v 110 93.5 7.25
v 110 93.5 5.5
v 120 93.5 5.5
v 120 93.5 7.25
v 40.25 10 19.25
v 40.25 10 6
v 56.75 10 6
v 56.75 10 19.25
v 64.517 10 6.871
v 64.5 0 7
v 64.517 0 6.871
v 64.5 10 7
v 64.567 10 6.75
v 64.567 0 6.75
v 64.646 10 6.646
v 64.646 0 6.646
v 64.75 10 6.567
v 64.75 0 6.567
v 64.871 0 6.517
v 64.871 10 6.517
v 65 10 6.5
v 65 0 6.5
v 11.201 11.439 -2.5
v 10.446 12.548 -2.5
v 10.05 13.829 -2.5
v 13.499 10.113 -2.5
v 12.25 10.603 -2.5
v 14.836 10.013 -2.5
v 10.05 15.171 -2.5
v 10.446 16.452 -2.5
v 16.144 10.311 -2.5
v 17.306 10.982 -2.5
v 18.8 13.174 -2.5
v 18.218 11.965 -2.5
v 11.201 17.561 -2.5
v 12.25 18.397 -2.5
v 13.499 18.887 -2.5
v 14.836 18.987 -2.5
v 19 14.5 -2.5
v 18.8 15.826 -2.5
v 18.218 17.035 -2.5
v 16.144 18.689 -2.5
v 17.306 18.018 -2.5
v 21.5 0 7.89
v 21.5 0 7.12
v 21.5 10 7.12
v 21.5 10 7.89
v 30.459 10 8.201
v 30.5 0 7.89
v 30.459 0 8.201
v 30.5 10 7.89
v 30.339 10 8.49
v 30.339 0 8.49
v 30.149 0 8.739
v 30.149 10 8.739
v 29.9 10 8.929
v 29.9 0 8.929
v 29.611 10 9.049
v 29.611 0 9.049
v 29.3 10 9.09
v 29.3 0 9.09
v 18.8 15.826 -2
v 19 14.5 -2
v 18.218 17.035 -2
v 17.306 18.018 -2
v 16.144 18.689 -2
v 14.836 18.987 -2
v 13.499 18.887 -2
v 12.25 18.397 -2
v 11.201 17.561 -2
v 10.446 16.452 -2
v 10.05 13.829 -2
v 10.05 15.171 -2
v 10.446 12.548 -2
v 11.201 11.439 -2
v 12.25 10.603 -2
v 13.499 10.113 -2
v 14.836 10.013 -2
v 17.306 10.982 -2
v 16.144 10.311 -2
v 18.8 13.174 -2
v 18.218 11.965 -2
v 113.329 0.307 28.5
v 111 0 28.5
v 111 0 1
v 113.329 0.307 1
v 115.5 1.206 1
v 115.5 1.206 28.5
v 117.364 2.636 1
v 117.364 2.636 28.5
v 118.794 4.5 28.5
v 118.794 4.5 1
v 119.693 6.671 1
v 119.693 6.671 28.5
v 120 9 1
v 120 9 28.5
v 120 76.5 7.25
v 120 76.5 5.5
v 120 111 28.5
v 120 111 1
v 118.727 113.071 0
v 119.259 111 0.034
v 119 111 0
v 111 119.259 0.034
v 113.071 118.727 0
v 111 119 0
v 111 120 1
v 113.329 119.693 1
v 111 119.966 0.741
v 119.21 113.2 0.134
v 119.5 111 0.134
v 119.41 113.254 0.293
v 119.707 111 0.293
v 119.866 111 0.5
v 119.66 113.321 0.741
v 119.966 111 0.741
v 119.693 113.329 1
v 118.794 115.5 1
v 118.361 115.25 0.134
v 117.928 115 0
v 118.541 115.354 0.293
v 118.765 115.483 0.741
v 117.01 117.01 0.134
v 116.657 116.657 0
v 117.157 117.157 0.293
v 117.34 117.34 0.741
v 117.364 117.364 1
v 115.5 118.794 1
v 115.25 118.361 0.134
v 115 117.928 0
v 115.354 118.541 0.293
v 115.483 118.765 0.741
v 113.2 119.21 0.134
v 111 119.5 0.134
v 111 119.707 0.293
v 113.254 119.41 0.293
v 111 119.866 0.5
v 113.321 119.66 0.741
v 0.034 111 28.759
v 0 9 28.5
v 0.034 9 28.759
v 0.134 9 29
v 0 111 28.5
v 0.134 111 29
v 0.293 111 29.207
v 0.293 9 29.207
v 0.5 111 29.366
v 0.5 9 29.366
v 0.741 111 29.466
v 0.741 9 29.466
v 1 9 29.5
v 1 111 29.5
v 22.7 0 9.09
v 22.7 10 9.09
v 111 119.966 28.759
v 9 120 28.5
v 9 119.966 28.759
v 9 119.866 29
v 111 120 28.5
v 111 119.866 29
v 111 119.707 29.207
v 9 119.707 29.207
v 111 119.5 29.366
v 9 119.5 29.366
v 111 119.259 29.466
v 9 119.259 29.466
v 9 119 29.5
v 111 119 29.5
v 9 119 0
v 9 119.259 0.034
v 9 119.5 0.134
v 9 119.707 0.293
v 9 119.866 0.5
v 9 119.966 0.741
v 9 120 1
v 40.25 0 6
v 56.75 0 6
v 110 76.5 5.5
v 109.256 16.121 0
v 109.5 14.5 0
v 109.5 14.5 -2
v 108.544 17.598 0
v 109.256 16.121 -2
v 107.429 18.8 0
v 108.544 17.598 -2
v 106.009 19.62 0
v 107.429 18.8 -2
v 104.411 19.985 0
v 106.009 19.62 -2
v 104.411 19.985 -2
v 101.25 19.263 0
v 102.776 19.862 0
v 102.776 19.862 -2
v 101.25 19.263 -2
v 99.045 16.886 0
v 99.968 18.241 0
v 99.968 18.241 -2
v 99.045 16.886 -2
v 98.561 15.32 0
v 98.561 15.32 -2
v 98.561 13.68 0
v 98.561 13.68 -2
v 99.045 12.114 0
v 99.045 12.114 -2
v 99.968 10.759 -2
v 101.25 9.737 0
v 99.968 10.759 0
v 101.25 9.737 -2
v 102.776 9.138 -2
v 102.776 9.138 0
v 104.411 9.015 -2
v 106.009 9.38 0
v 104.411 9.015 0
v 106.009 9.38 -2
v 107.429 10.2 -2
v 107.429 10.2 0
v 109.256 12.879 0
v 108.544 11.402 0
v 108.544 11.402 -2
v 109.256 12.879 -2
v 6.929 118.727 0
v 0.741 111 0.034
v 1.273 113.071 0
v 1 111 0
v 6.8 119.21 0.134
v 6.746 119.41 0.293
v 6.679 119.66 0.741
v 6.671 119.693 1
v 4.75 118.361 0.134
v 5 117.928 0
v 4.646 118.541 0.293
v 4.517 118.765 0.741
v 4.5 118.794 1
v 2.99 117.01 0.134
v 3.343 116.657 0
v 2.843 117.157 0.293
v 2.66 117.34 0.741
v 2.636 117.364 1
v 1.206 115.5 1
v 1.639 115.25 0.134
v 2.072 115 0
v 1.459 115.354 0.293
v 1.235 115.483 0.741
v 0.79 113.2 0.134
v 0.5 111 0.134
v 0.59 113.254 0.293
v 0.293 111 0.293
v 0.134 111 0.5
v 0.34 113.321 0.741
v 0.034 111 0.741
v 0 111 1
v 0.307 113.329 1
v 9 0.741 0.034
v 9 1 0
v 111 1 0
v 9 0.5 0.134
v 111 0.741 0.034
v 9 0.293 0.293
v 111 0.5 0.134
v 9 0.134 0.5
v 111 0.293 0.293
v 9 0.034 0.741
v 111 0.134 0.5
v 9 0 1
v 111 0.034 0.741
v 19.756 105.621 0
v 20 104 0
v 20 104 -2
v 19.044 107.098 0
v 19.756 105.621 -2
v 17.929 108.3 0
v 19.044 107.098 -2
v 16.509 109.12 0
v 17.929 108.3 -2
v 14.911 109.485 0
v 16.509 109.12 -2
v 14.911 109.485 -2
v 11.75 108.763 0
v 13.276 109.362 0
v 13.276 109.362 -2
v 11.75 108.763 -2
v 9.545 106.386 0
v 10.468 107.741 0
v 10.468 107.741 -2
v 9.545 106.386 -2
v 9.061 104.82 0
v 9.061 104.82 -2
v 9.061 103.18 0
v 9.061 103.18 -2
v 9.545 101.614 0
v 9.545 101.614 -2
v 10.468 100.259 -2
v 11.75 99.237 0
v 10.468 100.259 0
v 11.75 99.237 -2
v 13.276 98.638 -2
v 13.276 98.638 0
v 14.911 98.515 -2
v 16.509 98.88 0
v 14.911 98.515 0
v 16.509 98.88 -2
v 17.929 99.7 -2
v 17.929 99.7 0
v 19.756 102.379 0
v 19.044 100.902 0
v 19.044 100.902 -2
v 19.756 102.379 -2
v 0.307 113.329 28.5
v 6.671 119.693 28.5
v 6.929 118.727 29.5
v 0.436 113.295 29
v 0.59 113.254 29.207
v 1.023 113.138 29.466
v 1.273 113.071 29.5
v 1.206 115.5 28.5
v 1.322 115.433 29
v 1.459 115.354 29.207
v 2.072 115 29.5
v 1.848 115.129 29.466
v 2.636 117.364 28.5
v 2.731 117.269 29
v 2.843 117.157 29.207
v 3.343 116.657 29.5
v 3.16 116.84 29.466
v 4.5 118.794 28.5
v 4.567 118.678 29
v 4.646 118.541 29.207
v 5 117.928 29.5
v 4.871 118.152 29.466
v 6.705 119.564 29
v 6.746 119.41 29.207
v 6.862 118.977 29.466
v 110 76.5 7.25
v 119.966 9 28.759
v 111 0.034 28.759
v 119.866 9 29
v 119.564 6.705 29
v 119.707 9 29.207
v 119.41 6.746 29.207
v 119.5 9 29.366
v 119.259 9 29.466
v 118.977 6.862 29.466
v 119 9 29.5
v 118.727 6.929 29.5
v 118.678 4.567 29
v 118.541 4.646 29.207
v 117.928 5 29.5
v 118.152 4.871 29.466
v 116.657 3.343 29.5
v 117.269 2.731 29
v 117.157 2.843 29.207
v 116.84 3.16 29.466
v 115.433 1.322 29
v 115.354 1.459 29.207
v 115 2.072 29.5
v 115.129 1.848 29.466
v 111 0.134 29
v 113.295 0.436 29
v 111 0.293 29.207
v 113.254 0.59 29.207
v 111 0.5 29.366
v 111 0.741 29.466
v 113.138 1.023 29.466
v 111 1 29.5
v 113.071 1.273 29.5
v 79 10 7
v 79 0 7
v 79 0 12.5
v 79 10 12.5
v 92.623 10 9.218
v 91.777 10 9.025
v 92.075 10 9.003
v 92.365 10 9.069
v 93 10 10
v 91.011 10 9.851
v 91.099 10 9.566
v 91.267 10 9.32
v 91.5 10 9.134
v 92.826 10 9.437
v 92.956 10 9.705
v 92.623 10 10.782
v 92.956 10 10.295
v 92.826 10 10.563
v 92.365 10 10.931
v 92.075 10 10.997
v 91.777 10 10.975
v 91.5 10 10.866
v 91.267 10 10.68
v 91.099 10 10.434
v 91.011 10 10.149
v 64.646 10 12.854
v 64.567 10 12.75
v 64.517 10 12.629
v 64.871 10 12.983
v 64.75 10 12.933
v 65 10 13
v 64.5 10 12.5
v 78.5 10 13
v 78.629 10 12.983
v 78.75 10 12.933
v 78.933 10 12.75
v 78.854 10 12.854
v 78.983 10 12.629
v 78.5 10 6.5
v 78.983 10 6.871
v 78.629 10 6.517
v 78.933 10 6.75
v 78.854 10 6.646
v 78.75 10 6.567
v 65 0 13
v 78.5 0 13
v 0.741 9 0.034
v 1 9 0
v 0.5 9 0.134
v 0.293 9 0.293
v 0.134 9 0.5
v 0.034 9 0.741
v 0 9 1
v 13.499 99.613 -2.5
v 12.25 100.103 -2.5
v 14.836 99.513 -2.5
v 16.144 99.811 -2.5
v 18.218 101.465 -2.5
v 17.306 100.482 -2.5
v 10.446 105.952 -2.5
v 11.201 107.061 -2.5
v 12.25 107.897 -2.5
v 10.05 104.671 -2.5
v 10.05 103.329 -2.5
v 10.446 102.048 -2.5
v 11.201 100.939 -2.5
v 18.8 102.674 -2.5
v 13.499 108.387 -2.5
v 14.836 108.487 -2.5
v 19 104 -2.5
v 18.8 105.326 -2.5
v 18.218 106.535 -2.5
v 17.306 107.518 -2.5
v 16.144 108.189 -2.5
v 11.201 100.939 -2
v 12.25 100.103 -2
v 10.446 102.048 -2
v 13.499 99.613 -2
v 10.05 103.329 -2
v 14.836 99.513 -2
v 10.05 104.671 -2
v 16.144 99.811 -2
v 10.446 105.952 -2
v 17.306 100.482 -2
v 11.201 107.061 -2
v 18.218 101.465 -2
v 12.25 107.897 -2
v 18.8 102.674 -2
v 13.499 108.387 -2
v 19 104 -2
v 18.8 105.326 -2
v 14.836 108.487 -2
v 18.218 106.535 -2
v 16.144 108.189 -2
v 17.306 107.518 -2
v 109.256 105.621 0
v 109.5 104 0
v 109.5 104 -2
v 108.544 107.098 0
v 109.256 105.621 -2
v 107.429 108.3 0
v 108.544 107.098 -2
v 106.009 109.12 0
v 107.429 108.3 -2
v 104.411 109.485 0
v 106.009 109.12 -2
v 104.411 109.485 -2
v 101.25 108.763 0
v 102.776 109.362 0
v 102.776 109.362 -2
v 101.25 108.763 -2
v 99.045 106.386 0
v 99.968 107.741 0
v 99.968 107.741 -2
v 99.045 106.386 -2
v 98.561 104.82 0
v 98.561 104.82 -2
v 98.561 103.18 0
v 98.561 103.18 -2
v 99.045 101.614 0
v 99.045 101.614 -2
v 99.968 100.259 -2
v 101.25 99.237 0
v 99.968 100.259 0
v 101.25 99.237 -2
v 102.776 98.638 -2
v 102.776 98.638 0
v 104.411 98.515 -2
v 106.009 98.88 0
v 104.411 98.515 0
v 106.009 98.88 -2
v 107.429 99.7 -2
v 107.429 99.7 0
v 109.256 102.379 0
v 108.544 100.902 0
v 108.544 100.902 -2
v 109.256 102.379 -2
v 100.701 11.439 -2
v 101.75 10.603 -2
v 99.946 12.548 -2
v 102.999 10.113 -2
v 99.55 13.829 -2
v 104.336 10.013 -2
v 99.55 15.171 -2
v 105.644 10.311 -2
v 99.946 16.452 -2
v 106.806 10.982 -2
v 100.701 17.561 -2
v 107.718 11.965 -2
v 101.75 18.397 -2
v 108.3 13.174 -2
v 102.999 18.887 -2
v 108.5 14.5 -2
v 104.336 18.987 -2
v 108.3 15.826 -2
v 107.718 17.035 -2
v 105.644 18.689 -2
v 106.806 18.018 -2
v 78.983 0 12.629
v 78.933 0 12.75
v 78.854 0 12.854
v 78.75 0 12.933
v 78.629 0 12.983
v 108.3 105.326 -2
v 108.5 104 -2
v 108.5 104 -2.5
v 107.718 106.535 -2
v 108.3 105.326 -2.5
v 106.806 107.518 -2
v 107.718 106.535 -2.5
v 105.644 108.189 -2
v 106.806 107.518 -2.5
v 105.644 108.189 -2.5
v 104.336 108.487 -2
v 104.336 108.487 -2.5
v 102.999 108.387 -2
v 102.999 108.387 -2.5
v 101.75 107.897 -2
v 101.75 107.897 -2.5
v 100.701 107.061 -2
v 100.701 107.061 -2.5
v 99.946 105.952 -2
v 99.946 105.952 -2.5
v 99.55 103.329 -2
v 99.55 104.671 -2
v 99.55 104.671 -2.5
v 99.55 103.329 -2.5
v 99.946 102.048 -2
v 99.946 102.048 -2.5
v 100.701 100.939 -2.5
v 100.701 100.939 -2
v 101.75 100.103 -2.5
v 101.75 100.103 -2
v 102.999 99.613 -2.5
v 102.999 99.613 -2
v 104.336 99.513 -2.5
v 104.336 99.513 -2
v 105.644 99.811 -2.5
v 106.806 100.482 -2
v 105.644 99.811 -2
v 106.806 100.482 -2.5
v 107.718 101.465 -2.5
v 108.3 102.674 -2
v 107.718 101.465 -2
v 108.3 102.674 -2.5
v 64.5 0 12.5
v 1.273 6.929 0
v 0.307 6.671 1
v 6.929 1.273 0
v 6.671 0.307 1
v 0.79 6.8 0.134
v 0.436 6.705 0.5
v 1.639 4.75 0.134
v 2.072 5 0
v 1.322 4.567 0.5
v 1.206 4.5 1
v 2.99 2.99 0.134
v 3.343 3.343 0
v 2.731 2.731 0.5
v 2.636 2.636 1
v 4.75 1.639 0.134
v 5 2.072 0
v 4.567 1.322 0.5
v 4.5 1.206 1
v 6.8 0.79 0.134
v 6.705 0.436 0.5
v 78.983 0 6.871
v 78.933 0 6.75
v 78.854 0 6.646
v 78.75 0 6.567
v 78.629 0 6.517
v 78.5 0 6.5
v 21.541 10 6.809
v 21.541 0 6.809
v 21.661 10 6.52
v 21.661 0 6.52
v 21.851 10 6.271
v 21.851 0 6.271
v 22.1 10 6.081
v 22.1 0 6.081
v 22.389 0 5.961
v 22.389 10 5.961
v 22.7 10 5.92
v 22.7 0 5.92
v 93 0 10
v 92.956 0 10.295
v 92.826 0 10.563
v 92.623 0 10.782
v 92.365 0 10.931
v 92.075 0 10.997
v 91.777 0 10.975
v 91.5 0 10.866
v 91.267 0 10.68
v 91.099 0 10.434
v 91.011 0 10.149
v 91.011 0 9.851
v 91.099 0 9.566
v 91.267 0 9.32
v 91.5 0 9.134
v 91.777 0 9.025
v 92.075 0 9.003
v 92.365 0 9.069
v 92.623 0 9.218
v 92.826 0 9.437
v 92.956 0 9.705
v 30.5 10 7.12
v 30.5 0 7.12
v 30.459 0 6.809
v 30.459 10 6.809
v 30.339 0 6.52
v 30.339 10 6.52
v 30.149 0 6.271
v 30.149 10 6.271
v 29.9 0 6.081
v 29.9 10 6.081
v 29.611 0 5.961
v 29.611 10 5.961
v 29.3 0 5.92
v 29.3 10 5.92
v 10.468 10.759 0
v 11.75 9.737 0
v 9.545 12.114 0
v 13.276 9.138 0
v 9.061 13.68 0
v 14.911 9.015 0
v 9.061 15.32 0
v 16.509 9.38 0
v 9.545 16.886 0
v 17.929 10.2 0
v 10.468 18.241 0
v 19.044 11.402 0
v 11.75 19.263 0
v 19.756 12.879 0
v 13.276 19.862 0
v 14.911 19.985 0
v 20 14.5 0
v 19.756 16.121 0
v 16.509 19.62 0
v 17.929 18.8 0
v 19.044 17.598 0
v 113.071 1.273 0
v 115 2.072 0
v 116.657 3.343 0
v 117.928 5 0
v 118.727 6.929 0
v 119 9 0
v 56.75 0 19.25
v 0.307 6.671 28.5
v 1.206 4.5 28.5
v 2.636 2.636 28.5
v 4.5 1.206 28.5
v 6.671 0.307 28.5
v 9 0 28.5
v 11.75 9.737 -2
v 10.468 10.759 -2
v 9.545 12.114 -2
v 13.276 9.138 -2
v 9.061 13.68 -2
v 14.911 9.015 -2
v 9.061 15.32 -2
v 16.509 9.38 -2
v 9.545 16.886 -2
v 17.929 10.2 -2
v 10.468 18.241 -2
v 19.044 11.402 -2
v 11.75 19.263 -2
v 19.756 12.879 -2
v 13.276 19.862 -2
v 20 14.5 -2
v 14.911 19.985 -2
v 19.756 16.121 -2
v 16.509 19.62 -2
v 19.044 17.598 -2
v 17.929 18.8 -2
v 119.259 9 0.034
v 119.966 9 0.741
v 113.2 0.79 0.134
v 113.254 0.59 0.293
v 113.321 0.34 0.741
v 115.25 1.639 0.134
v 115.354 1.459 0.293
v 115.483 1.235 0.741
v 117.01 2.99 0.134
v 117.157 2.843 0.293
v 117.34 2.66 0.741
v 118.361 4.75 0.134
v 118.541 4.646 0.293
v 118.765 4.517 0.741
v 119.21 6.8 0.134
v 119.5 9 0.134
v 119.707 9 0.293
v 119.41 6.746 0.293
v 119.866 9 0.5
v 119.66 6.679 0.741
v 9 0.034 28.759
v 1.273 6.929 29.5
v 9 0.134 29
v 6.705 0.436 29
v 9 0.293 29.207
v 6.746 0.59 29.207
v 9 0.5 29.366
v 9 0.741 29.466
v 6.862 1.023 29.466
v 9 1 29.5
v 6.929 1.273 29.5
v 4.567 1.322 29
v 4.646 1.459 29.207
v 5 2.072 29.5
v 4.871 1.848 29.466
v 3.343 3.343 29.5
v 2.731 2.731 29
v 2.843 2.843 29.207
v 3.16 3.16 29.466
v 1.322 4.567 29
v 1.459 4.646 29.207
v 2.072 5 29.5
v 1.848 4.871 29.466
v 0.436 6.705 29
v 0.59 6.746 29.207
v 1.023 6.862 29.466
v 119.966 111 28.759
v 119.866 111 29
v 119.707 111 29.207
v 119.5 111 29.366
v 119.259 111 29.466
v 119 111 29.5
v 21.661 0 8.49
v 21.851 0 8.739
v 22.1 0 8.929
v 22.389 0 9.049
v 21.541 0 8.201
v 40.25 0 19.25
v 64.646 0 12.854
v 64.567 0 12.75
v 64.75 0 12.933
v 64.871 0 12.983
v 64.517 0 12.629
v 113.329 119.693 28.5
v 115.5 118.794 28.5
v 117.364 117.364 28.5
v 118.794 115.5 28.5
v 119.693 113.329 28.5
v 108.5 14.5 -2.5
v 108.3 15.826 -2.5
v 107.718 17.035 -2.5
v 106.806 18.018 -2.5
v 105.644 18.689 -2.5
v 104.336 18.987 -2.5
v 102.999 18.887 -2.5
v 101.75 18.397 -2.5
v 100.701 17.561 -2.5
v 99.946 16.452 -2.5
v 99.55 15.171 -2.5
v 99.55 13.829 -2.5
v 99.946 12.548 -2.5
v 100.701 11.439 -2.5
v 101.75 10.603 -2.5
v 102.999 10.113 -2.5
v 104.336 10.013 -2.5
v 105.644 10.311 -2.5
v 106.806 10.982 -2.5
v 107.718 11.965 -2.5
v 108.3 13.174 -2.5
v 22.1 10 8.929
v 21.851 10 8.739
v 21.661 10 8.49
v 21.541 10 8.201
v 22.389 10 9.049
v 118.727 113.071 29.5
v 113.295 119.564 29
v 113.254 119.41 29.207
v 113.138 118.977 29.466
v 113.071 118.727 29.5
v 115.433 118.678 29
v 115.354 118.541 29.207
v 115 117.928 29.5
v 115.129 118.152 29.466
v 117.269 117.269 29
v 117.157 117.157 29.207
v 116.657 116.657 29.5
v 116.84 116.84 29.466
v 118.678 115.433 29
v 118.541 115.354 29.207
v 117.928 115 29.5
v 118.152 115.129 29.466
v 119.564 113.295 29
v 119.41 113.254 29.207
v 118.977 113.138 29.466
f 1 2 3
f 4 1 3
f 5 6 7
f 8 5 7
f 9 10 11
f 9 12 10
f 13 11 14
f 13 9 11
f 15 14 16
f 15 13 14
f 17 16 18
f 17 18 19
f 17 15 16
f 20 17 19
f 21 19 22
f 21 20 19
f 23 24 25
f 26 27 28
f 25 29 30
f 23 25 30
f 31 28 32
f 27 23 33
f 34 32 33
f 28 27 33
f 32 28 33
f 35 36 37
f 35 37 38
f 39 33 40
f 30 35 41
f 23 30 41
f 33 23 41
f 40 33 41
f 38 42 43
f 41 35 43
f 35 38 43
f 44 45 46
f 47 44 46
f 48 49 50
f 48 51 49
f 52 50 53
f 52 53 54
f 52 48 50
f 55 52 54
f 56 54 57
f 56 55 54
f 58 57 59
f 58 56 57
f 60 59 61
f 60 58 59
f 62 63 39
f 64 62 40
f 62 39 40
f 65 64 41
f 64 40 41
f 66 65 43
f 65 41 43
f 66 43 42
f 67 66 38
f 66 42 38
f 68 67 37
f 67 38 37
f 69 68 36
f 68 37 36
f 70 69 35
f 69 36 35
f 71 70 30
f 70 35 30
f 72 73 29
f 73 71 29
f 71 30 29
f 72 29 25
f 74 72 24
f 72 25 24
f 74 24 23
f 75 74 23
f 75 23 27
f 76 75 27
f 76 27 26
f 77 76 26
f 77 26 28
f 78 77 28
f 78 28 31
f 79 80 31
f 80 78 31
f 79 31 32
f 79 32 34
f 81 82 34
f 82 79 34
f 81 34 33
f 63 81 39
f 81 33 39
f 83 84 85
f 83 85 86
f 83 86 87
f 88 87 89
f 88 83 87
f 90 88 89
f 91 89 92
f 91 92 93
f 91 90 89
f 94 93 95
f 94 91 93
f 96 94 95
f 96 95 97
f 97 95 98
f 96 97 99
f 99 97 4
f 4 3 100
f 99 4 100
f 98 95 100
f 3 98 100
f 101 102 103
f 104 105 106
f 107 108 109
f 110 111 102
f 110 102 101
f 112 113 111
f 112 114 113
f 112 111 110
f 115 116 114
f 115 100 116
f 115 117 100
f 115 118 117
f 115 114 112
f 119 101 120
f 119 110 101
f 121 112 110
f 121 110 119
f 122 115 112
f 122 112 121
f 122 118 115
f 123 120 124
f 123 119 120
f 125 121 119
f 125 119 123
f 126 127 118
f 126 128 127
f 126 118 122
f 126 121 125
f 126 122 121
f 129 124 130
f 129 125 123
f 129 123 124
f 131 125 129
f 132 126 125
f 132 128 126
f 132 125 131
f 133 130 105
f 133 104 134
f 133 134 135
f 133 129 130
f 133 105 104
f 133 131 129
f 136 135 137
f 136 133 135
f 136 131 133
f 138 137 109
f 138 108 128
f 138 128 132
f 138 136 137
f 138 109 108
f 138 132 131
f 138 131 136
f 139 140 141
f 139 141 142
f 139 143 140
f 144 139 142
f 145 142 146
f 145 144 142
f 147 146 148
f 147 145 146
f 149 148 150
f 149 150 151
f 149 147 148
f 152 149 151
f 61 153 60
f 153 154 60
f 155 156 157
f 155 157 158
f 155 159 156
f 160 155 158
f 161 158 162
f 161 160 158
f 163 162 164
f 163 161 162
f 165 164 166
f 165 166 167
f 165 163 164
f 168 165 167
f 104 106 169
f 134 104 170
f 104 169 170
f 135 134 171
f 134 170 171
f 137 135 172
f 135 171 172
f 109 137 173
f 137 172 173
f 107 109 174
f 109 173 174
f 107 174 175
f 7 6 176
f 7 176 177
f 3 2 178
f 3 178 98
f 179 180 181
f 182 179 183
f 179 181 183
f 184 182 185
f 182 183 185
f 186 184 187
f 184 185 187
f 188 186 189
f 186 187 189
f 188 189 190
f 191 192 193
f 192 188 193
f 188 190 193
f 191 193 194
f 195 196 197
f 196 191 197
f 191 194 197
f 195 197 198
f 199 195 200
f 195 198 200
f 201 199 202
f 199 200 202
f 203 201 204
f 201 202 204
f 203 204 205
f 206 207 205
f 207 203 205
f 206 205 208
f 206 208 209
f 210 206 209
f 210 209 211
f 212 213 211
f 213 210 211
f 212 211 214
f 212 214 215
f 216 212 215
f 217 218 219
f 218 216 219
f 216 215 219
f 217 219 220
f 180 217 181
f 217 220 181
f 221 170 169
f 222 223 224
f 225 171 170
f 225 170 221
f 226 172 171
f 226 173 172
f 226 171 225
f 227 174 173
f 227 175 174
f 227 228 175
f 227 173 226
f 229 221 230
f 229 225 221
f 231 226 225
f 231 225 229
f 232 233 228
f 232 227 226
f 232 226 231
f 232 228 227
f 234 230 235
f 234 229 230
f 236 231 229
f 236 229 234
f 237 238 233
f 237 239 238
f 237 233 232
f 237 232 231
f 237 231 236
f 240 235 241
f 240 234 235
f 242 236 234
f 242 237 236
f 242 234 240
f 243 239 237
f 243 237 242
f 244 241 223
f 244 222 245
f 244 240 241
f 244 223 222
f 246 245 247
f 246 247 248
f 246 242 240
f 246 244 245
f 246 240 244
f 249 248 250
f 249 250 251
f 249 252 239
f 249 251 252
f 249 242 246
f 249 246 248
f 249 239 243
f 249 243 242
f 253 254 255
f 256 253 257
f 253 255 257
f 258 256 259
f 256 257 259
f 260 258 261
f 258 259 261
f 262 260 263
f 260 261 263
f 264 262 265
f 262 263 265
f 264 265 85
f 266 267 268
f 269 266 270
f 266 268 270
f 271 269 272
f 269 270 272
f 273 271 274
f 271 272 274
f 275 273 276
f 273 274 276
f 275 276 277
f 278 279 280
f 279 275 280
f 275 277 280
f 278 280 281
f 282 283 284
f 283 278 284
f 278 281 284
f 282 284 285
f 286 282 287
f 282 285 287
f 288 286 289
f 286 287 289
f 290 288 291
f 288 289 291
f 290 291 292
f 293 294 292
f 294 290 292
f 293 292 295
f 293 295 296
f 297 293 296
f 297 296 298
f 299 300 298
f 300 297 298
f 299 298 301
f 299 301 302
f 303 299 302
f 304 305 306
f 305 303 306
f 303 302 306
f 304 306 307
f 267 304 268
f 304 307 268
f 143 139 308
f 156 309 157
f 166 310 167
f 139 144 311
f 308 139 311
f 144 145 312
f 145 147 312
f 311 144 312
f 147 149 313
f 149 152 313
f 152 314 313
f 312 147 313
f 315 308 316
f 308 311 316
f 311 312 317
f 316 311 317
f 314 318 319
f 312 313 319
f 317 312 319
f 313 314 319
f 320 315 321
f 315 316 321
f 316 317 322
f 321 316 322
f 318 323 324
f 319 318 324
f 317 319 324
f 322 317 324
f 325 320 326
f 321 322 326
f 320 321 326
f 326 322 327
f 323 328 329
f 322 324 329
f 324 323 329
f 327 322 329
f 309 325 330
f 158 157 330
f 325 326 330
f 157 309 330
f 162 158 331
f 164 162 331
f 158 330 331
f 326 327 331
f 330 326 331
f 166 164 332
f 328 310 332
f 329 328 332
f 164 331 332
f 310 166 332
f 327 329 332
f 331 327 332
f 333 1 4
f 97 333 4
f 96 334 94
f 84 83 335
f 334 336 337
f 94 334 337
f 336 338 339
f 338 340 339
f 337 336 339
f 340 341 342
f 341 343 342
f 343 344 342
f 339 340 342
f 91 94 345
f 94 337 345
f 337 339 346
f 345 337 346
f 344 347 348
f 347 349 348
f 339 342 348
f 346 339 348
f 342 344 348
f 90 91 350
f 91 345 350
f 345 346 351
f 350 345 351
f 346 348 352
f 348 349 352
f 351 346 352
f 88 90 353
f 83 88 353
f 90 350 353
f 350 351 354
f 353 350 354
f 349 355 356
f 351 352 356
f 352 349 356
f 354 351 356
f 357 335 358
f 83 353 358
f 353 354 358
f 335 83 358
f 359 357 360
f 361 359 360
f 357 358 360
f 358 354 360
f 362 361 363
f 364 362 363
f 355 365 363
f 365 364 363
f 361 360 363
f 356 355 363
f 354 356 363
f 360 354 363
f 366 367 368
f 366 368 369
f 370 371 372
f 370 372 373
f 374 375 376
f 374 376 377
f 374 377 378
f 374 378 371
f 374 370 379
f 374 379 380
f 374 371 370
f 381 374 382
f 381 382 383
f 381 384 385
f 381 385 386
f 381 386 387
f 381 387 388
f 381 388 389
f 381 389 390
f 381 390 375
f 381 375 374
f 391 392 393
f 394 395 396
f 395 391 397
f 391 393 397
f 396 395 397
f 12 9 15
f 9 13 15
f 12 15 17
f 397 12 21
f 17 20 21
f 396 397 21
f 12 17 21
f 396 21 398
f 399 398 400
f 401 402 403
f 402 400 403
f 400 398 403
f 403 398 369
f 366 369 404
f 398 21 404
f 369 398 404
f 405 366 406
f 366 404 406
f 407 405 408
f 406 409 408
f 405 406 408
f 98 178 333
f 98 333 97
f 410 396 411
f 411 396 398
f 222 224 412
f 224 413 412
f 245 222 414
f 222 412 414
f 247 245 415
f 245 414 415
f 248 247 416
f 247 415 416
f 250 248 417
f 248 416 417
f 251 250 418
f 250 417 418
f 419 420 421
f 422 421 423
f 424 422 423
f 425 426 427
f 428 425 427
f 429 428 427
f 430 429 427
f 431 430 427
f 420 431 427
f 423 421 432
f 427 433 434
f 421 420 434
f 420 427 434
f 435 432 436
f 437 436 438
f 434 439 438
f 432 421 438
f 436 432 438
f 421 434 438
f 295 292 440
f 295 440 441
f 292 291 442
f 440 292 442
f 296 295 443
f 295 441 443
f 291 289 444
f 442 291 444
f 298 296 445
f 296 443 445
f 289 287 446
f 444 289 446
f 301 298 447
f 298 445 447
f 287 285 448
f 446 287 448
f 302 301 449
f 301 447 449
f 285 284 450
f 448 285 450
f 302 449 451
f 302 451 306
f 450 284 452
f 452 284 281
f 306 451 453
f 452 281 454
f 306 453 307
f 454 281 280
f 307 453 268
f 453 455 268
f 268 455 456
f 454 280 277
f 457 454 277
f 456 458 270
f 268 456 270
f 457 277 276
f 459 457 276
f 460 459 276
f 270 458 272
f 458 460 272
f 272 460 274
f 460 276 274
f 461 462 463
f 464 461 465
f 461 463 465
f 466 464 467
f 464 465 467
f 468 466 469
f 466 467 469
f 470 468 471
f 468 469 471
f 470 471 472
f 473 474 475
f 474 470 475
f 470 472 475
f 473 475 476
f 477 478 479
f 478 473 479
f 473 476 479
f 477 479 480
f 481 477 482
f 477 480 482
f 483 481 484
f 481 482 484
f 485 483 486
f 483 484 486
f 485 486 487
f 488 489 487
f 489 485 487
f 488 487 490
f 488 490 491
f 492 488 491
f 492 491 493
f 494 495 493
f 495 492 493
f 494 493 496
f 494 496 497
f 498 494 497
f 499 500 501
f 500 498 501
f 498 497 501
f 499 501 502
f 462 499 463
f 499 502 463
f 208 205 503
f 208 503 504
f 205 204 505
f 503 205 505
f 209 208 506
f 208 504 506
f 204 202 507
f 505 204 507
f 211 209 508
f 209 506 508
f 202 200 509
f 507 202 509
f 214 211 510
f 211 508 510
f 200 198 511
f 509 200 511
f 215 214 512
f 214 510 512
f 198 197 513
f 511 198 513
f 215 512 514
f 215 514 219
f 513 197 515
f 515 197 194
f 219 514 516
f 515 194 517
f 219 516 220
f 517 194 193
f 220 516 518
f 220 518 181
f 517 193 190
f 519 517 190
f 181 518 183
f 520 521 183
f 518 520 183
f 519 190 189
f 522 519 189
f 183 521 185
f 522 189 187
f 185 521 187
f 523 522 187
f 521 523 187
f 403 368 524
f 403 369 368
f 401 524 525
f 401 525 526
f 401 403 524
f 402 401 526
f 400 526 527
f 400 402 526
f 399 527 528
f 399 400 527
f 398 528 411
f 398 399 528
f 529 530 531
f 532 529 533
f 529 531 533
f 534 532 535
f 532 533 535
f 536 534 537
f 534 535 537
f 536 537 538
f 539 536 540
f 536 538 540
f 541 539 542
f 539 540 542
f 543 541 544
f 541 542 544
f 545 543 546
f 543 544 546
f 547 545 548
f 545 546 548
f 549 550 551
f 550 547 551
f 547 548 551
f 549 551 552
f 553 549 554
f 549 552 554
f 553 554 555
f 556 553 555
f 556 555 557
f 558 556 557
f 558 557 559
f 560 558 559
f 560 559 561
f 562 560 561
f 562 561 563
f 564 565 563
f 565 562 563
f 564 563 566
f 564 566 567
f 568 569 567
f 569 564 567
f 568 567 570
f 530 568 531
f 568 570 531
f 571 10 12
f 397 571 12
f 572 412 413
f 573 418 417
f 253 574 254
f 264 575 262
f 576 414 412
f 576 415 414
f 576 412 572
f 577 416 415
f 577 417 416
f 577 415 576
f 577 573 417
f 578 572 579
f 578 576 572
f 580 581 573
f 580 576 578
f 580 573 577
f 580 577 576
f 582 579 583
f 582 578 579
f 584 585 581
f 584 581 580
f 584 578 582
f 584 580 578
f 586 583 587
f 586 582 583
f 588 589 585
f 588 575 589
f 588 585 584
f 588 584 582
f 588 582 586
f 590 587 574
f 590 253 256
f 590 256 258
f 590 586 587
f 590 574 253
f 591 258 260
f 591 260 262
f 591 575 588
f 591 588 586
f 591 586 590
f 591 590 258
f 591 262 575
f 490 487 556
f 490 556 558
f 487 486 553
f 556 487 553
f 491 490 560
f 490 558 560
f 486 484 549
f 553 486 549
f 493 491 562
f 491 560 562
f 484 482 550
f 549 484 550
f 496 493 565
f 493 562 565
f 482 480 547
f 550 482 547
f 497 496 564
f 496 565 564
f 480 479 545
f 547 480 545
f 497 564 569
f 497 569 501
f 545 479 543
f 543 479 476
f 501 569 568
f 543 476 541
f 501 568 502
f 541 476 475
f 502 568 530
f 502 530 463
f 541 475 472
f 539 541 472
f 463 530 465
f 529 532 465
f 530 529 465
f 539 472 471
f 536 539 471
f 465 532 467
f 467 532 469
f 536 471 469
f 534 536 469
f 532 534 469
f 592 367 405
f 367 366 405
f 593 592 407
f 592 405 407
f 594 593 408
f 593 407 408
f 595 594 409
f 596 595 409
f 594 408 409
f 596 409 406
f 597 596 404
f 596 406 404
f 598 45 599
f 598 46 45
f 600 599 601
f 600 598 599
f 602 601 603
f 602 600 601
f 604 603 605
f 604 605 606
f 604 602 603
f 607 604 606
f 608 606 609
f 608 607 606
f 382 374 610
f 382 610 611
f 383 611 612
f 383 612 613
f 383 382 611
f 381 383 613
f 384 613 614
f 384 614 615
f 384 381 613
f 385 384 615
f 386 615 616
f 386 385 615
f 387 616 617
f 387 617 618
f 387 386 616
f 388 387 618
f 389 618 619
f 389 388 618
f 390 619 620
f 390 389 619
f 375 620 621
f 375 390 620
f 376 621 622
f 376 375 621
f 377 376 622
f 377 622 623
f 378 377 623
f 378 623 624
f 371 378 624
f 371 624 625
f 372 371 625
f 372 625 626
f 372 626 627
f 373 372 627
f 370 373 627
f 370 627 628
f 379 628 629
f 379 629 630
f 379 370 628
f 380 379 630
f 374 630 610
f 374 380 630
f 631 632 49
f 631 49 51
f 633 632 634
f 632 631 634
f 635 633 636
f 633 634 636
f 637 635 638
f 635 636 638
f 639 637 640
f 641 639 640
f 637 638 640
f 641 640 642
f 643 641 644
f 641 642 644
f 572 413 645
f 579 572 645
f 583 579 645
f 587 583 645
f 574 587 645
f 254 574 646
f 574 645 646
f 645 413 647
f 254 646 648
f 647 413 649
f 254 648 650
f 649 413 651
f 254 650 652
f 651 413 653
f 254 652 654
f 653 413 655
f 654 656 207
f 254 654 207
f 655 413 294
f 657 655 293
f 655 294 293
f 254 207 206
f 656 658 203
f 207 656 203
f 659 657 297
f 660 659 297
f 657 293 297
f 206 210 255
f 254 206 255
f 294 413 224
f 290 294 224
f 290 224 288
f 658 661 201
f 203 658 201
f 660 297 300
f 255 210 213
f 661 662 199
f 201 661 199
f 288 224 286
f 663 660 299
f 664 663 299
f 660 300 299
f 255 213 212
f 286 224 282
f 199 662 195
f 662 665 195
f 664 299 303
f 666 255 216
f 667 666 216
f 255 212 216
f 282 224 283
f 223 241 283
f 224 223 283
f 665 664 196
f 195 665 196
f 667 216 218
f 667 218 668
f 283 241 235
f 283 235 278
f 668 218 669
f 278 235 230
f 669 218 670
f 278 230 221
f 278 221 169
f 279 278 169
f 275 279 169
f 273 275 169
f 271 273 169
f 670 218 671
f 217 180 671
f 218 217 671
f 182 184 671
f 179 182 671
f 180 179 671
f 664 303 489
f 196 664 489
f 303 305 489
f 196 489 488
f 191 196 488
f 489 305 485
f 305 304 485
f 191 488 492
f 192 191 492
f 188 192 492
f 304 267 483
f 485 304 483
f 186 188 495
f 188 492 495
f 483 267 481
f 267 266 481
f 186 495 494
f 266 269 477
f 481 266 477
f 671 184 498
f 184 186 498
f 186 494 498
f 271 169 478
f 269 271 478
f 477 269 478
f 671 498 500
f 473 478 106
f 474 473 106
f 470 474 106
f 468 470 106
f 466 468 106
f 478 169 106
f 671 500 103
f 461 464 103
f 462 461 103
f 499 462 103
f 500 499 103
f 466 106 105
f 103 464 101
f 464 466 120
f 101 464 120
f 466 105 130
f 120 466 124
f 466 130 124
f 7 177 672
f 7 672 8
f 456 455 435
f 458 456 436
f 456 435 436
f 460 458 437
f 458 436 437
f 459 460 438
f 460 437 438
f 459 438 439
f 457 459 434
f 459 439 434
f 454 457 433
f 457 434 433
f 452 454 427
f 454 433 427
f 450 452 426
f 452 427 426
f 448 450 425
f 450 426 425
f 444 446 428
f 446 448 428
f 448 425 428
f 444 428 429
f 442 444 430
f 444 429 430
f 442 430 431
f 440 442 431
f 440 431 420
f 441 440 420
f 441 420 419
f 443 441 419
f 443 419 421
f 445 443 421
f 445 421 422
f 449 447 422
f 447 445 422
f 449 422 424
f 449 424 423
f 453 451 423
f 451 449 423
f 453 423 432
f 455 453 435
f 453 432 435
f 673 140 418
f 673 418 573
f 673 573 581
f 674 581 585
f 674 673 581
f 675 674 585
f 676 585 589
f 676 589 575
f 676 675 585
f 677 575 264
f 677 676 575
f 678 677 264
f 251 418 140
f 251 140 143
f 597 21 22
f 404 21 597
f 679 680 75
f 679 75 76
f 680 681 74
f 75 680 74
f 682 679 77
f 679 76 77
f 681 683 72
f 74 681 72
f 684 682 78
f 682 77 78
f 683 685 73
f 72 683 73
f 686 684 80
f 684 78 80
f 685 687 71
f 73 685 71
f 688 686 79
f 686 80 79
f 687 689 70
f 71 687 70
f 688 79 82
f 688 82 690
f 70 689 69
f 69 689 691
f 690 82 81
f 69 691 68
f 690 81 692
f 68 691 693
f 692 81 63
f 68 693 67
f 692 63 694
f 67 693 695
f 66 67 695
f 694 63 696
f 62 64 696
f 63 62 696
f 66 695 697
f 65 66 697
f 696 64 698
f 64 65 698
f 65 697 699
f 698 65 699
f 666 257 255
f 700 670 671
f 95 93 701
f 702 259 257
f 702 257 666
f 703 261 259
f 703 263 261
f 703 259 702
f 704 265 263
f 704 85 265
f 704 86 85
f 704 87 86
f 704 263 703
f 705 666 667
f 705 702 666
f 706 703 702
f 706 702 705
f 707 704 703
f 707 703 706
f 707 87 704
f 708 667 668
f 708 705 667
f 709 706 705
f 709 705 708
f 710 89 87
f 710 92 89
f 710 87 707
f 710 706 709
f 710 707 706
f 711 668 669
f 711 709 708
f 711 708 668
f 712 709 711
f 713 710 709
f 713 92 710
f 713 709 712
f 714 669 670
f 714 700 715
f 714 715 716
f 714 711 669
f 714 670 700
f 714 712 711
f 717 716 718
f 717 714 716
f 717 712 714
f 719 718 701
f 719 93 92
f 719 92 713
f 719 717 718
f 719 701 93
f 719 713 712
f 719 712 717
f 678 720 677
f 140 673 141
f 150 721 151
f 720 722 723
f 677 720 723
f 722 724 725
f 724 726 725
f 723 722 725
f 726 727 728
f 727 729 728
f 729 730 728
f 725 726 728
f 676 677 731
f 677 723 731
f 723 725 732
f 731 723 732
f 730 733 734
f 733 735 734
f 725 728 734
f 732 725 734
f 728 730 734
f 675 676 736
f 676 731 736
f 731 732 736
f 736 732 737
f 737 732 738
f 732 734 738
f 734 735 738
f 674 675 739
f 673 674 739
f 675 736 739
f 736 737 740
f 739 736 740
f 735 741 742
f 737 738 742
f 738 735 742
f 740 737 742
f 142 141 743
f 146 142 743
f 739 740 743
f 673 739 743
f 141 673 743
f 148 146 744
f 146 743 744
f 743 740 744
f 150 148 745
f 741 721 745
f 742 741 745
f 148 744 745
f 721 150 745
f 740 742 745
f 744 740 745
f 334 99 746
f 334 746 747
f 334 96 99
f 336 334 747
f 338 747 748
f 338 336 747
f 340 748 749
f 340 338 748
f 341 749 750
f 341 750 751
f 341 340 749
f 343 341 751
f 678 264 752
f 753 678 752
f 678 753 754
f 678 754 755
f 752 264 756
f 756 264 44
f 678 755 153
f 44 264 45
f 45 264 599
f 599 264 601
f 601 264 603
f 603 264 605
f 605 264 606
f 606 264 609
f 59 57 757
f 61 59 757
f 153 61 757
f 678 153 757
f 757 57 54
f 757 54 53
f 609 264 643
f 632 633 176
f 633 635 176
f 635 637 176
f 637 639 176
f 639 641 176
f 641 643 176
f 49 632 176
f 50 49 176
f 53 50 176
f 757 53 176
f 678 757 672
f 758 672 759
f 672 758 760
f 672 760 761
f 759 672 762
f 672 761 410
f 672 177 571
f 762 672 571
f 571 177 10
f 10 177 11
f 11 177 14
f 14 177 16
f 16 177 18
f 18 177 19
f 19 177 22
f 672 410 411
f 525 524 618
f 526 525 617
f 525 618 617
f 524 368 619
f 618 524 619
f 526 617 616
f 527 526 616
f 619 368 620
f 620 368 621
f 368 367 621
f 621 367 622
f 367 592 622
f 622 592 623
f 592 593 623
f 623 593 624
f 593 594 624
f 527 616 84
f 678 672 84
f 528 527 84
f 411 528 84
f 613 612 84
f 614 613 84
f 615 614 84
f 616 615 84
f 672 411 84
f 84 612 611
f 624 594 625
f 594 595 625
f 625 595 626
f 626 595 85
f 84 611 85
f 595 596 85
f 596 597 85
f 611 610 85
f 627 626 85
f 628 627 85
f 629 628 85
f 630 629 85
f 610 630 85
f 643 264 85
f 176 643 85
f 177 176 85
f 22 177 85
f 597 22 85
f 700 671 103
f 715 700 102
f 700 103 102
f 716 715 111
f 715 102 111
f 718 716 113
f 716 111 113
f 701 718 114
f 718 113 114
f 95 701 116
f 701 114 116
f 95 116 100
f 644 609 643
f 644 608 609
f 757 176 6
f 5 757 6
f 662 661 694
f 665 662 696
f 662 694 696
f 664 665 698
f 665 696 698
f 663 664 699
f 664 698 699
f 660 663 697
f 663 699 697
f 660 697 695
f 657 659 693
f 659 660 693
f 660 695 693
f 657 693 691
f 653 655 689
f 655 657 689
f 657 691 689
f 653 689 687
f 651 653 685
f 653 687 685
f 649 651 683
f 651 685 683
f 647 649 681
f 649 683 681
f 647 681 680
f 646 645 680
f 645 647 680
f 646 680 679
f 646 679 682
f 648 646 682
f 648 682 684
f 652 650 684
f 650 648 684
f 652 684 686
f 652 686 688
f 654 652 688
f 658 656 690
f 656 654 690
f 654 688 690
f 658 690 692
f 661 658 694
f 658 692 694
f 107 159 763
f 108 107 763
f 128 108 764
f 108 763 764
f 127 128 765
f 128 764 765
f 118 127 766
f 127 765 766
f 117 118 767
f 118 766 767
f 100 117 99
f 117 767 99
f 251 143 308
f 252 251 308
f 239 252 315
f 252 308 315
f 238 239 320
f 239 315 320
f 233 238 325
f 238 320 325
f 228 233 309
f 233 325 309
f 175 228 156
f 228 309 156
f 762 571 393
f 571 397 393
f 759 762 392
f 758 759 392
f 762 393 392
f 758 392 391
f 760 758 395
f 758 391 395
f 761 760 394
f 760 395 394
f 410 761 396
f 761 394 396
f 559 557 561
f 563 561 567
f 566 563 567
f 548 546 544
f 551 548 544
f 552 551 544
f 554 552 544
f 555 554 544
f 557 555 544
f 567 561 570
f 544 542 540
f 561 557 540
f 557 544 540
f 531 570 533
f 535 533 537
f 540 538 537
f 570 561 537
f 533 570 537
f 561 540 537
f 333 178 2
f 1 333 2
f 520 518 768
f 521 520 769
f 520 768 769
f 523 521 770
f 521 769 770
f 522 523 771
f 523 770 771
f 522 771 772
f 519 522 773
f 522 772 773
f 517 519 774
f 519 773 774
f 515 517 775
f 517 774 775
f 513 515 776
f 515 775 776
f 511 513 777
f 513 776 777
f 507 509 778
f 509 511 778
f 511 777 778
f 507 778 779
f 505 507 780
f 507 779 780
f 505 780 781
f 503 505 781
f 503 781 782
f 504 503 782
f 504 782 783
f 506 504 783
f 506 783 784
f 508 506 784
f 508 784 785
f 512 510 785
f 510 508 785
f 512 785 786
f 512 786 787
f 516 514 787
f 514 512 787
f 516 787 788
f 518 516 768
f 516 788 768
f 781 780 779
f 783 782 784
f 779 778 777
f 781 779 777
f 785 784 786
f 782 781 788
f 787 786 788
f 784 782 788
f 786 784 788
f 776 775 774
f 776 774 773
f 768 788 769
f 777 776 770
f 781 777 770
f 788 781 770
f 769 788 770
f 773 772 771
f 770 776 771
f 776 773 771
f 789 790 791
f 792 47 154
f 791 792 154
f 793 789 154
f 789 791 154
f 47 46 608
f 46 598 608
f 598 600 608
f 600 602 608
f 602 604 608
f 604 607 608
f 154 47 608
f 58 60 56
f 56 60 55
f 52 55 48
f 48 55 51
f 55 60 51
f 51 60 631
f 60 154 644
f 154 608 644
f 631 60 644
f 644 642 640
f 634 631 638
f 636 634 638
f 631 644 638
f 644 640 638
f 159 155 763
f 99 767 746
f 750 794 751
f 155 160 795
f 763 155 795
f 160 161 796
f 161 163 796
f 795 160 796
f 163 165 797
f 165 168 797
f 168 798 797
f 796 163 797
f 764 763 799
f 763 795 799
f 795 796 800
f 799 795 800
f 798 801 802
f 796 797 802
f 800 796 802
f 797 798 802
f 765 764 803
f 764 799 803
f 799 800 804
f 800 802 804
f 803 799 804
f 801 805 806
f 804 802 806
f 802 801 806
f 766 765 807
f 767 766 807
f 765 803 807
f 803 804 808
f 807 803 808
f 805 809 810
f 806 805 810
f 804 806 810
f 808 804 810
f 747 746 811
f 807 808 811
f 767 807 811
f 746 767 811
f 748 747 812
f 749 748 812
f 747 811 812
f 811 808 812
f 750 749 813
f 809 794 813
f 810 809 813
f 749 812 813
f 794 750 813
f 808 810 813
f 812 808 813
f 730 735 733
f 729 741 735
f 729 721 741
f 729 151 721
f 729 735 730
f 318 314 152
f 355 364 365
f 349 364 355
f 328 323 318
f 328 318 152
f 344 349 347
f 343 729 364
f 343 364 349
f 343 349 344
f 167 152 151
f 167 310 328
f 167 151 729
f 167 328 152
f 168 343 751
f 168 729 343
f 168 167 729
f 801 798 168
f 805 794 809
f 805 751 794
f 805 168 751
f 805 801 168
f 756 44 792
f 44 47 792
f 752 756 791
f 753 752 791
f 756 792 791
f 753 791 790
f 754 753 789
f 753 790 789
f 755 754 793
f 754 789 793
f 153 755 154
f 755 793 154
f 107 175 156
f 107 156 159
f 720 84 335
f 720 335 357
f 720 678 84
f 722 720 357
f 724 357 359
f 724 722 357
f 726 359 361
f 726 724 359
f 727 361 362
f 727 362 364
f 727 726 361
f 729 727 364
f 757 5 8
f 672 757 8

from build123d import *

# Parameters (mm, degrees)
CYLINDER012_R     = 4.5
CYLINDER012_DEPTH = 10
CYLINDER011_R     = 5.5
CYLINDER011_DEPTH = 10
CYLINDER014_R     = 4.5
CYLINDER014_DEPTH = 10
CYLINDER013_R     = 5.5
CYLINDER013_DEPTH = 10
CYLINDER016_R     = 4.5
CYLINDER016_DEPTH = 10
CYLINDER015_R     = 5.5
CYLINDER015_DEPTH = 10
CYLINDER018_R     = 4.5
CYLINDER018_DEPTH = 10
CYLINDER017_R     = 5.5
CYLINDER017_DEPTH = 10
BOX023_W          = 10
BOX023_H          = 17
BOX023_DEPTH      = 1.75
CYLINDER010_R     = 1
CYLINDER010_DEPTH = 10
BOX022_W          = 14.5
BOX022_H          = 10
BOX022_DEPTH      = 6.5
FILLET009_R       = 0.5
BOX021_W          = 16.5
BOX021_H          = 10
BOX021_DEPTH      = 13.25
BOX020_W          = 9
BOX020_H          = 10
BOX020_DEPTH      = 3.17
FILLET008_R       = 1.2
BOX019_W          = 120
BOX019_H          = 120
BOX019_DEPTH      = 29.5
FILLET010_R       = 9
FILLET011_R       = 1


with BuildPart() as cylinder012:
    # Cylinder012 → Cylinder012 (new body)
    with BuildSketch(Plane(origin=(14.5, 14.5, -2.5), x_dir=(1, 0, 0), z_dir=(0, 0, 1))):
        Circle(CYLINDER012_R)
    extrude(amount=CYLINDER012_DEPTH)


with BuildPart() as base_pad001:
    # Cylinder011 → Cylinder011 (new body)
    with BuildSketch(Plane(origin=(14.5, 14.5, -2), x_dir=(1, 0, 0), z_dir=(0, 0, 1))):
        Circle(CYLINDER011_R)
    extrude(amount=CYLINDER011_DEPTH)

    # Fusion008: union Cylinder012
    add(cylinder012.part)


with BuildPart() as cylinder014:
    # Cylinder014 → Cylinder014 (new body)
    with BuildSketch(Plane(origin=(14.5, 14.5, -2.5), x_dir=(1, 0, 0), z_dir=(0, 0, 1))):
        Circle(CYLINDER014_R)
    extrude(amount=CYLINDER014_DEPTH)


with BuildPart() as base_pad002:
    # Cylinder013 → Cylinder013 (new body)
    with BuildSketch(Plane(origin=(14.5, 14.5, -2), x_dir=(1, 0, 0), z_dir=(0, 0, 1))):
        Circle(CYLINDER013_R)
    extrude(amount=CYLINDER013_DEPTH)

    # Fusion009: union Cylinder014
    add(cylinder014.part)


with BuildPart() as base_pad002_1:
    # Fusion009 placement: moved
    add(base_pad002.part.moved(Location((0, 89.5, 0))))


with BuildPart() as cylinder016:
    # Cylinder016 → Cylinder016 (new body)
    with BuildSketch(Plane(origin=(14.5, 14.5, -2.5), x_dir=(1, 0, 0), z_dir=(0, 0, 1))):
        Circle(CYLINDER016_R)
    extrude(amount=CYLINDER016_DEPTH)


with BuildPart() as base_pad003:
    # Cylinder015 → Cylinder015 (new body)
    with BuildSketch(Plane(origin=(14.5, 14.5, -2), x_dir=(1, 0, 0), z_dir=(0, 0, 1))):
        Circle(CYLINDER015_R)
    extrude(amount=CYLINDER015_DEPTH)

    # Fusion002: union Cylinder016
    add(cylinder016.part)


with BuildPart() as base_pad003_1:
    # Fusion002 placement: moved
    add(base_pad003.part.moved(Location((89.5, 0, 0))))


with BuildPart() as cylinder018:
    # Cylinder018 → Cylinder018 (new body)
    with BuildSketch(Plane(origin=(14.5, 14.5, -2.5), x_dir=(1, 0, 0), z_dir=(0, 0, 1))):
        Circle(CYLINDER018_R)
    extrude(amount=CYLINDER018_DEPTH)


with BuildPart() as base_pad004:
    # Cylinder017 → Cylinder017 (new body)
    with BuildSketch(Plane(origin=(14.5, 14.5, -2), x_dir=(1, 0, 0), z_dir=(0, 0, 1))):
        Circle(CYLINDER017_R)
    extrude(amount=CYLINDER017_DEPTH)

    # Fusion010: union Cylinder018
    add(cylinder018.part)


with BuildPart() as base_pad004_1:
    # Fusion010 placement: moved
    add(base_pad004.part.moved(Location((89.5, 89.5, 0))))


with BuildPart() as cube018:
    # Box023 → Box023 (new body)
    with BuildSketch(Plane(origin=(110, 76.5, 5.5), x_dir=(1, 0, 0), z_dir=(0, 0, 1))):
        with Locations((5, 8.5)):
            Rectangle(BOX023_W, BOX023_H)
    extrude(amount=BOX023_DEPTH)


with BuildPart() as cylinder010:
    # Cylinder010 → Cylinder010 (new body)
    with BuildSketch(Plane(origin=(92, 10, 10), x_dir=(1, 0, 0), z_dir=(0, -1, 0))):
        Circle(CYLINDER010_R)
    extrude(amount=CYLINDER010_DEPTH)


with BuildPart() as usb_hole:
    # Box022 → Box022 (new body)
    with BuildSketch(Plane.XY):
        with Locations((7.25, 5)):
            Rectangle(BOX022_W, BOX022_H)
    extrude(amount=BOX022_DEPTH)

    # Fillet009
    fillet009_edges = [usb_hole.edges().sort_by_distance(p)[0] for p in [
        (0, 5, 6.5),
        (0, 5, 0),
        (14.5, 5, 6.5),
        (14.5, 5, 0),
    ]]
    fillet(fillet009_edges, radius=FILLET009_R)


with BuildPart() as usb_hole_1:
    # Fillet009 placement: moved
    add(usb_hole.part.moved(Location((64.5, 0, 6.5))))


with BuildPart() as cube016:
    # Box021 → Box021 (new body)
    with BuildSketch(Plane(origin=(40.25, 0, 6), x_dir=(1, 0, 0), z_dir=(0, 0, 1))):
        with Locations((8.25, 5)):
            Rectangle(BOX021_W, BOX021_H)
    extrude(amount=BOX021_DEPTH)


with BuildPart() as fillet008:
    # Box020 → Box020 (new body)
    with BuildSketch(Plane(origin=(21.5, -6, 5.92), x_dir=(1, 0, 0), z_dir=(0, 0, 1))):
        with Locations((4.5, 5)):
            Rectangle(BOX020_W, BOX020_H)
    extrude(amount=BOX020_DEPTH)

    # Fillet008
    fillet008_edges = [fillet008.edges().sort_by_distance(p)[0] for p in [
        (21.5, -1, 9.09),
        (21.5, -1, 5.92),
        (30.5, -1, 9.09),
        (30.5, -1, 5.92),
    ]]
    fillet(fillet008_edges, radius=FILLET008_R)


with BuildPart() as fillet008_1:
    # Fillet008 placement: moved
    add(fillet008.part.moved(Location((0, 6, 0))))


with BuildPart() as gateway_box:
    # Box019 → Box019 (new body)
    with BuildSketch(Plane.XY):
        with Locations((60, 60)):
            Rectangle(BOX019_W, BOX019_H)
    extrude(amount=BOX019_DEPTH)

    # Cut012: cut Fillet008
    add(fillet008_1.part, mode=Mode.SUBTRACT)

    # Cut013: cut Cube016
    add(cube016.part, mode=Mode.SUBTRACT)

    # Cut014: cut USB_Hole
    add(usb_hole_1.part, mode=Mode.SUBTRACT)

    # Cut015: cut Cylinder010
    add(cylinder010.part, mode=Mode.SUBTRACT)

    # Cut016: cut Cube018
    add(cube018.part, mode=Mode.SUBTRACT)

    # Fillet010
    fillet010_edges = [gateway_box.edges().sort_by_distance(p)[0] for p in [
        (0, 0, 14.75),
        (0, 120, 14.75),
        (120, 0, 14.75),
        (120, 120, 14.75),
    ]]
    fillet(fillet010_edges, radius=FILLET010_R)

    # Fusion004: union base_pad001, base_pad002, base_pad003, base_pad004
    add(base_pad001.part)
    add(base_pad002_1.part)
    add(base_pad003_1.part)
    add(base_pad004_1.part)

    # Fillet011
    fillet011_edges = [gateway_box.edges().sort_by_distance(p)[0] for p in [
        (0, 60, 29.5),
        (0, 111, 14.75),
        (2.636039, 2.636039, 29.5),
        (2.636039, 117.363961, 29.5),
        (60, 0, 29.5),
        (60, 120, 29.5),
        (117.363961, 2.636039, 29.5),
        (117.363961, 117.363961, 29.5),
        (120, 60, 29.5),
        (2.636039, 2.636039, 0),
        (2.636039, 117.363961, 0),
        (9, 120, 14.75),
        (60, 0, 0),
        (60, 120, 0),
        (117.363961, 2.636039, 0),
        (117.363961, 117.363961, 0),
    ]]
    fillet(fillet011_edges, radius=FILLET011_R)


solid = gateway_box.part
